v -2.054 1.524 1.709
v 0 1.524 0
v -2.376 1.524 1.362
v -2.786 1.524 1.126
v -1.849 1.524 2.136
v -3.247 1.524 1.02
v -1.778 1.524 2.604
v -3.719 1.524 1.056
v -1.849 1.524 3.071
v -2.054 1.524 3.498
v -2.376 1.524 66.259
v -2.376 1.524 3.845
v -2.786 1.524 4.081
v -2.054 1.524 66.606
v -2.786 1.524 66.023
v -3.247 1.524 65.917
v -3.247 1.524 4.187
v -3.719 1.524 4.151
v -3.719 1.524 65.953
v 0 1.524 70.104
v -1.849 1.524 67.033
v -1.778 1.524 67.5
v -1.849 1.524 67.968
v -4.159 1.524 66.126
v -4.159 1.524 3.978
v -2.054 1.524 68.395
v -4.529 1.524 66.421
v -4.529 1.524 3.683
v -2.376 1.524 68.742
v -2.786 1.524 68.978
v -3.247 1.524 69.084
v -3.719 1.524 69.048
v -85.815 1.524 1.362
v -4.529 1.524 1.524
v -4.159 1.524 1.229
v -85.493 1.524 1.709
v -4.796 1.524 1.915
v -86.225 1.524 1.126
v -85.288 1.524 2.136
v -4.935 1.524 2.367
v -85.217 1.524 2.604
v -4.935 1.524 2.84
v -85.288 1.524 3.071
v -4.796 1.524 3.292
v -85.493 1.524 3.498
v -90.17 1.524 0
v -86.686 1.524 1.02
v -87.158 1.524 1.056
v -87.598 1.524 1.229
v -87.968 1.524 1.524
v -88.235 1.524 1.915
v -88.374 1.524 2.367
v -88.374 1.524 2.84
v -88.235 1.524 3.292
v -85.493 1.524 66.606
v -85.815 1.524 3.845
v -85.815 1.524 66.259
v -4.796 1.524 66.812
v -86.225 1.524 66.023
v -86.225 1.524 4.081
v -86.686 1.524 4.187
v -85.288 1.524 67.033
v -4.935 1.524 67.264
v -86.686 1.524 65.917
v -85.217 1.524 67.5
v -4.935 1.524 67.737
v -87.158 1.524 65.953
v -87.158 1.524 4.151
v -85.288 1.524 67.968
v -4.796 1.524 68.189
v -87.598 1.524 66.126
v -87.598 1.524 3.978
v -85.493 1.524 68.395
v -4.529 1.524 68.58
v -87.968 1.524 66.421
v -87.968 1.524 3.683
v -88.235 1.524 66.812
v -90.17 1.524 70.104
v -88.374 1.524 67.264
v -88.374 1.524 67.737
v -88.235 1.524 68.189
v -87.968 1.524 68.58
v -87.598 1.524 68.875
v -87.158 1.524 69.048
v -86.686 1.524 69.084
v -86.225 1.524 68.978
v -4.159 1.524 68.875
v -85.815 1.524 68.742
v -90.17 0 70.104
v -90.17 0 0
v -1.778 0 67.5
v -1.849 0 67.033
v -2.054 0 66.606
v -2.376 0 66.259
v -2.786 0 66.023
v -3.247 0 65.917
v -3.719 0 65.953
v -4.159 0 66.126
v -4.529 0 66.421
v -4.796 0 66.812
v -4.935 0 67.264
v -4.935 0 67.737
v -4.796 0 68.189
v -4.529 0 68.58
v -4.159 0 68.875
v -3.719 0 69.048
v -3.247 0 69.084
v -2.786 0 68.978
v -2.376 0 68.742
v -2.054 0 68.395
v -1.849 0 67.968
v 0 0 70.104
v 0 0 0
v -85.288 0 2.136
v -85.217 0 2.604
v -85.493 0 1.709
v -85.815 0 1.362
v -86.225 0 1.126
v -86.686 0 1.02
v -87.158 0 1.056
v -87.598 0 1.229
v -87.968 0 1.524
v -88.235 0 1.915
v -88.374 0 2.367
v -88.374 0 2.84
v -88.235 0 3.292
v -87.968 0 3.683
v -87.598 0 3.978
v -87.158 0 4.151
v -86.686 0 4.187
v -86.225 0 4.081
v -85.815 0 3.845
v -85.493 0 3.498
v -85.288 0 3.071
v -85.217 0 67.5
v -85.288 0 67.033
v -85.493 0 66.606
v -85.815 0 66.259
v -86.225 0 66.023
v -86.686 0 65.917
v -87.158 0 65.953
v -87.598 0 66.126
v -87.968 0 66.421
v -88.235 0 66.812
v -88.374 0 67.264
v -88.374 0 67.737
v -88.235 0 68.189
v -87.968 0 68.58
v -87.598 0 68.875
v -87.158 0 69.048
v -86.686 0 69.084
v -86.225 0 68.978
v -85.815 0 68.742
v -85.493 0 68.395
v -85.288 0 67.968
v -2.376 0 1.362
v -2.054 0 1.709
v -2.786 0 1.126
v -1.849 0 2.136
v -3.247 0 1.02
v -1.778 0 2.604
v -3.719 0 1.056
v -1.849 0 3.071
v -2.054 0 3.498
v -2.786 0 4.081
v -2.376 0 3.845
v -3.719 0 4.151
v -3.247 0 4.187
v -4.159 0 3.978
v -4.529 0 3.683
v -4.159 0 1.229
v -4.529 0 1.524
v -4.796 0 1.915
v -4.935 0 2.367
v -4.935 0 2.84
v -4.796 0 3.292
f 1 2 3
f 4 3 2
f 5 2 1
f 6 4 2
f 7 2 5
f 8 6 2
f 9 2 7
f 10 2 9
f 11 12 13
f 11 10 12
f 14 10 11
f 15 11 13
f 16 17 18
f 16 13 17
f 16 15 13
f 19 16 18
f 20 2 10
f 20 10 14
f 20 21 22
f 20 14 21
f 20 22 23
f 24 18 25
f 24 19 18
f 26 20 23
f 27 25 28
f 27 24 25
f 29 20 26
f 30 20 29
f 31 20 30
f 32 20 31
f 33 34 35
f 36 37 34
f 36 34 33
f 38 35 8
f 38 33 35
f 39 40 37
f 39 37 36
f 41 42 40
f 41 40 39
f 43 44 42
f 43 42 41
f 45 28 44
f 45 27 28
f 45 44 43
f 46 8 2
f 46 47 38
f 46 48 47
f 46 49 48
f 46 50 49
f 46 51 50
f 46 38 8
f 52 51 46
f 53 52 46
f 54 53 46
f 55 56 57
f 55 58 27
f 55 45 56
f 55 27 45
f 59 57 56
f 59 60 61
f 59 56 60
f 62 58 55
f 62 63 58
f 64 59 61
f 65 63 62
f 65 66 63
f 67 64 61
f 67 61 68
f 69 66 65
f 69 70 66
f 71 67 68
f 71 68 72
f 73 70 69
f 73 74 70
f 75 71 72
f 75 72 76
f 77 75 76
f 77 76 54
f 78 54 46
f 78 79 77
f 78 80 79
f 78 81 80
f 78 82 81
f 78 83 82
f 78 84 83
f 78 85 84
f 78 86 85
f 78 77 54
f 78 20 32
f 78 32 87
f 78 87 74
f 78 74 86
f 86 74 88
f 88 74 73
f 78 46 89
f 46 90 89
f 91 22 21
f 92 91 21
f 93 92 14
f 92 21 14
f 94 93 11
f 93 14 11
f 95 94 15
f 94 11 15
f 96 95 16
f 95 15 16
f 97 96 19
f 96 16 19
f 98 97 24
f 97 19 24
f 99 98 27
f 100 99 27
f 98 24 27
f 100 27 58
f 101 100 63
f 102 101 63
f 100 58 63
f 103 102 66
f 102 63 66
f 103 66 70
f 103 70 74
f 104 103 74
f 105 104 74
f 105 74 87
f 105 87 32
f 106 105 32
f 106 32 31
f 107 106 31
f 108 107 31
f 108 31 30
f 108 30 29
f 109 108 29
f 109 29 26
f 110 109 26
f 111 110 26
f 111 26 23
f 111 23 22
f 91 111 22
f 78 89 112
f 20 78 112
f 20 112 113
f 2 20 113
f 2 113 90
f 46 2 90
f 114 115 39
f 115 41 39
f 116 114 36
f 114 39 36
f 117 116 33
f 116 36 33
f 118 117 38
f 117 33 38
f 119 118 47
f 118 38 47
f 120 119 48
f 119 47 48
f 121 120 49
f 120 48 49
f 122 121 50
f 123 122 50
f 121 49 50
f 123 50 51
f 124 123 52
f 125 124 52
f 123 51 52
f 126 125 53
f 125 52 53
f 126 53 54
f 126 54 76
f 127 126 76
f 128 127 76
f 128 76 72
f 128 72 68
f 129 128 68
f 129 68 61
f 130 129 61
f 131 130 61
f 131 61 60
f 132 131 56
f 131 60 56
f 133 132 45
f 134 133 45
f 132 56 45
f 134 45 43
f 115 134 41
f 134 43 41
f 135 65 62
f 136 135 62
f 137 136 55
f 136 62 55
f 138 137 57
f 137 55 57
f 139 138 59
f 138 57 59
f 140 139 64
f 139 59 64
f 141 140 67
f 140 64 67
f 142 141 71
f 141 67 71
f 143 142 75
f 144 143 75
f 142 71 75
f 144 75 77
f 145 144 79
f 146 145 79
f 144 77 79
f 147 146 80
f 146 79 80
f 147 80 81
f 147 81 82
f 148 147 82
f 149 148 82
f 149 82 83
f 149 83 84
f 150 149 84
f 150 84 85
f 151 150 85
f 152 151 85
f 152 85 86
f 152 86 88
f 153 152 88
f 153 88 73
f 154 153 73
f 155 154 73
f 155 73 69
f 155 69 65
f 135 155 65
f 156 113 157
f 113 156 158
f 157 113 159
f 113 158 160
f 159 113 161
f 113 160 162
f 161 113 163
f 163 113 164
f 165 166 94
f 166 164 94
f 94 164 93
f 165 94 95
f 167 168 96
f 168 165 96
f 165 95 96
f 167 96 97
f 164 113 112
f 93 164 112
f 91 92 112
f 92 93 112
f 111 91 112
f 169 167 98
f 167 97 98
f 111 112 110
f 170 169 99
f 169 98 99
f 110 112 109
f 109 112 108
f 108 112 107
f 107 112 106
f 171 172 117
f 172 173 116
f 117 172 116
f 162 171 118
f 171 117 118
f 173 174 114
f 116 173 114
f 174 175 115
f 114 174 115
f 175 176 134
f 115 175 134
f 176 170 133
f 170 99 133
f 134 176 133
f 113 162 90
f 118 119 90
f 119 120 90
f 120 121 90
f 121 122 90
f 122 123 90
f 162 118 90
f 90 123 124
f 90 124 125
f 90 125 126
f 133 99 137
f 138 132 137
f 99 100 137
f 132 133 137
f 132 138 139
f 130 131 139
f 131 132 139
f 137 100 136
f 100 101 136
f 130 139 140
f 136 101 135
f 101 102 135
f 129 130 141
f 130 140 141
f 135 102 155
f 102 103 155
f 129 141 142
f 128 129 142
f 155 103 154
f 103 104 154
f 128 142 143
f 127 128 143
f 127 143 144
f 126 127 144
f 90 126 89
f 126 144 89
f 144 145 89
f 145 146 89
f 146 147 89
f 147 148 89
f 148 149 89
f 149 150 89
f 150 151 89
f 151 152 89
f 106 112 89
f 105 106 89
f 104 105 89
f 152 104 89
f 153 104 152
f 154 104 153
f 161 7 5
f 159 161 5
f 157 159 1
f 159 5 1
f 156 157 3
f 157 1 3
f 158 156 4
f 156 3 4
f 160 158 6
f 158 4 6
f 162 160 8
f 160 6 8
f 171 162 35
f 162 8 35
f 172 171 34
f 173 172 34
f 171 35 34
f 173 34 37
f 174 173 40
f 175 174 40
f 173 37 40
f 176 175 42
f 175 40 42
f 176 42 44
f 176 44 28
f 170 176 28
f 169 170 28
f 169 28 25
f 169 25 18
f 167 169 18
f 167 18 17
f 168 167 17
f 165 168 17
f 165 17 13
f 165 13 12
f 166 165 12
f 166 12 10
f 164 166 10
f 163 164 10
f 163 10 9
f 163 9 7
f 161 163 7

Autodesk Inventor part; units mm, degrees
ref_plane "YZ Plane" through (0, 0, 0) normal (1, 0, 0) x (0, 1, 0)
ref_plane "XZ Plane" through (0, 0, 0) normal (0, 1, 0) x (-1, 0, 0)
ref_plane "XY Plane" through (0, 0, 0) normal (0, 0, 1) x (1, 0, 0)
sketch "Sketch1" plane through (0, 0, 0) normal (0, 1, 0) x (-1, 0, 0)
  line L0 (0, 0) -> (90.17, 0)
  line L1 (90.17, 0) -> (90.17, 70.104)
  line L2 (90.17, 70.104) -> (0, 70.104)
  line L3 (0, 70.104) -> (0, 0)
  dimension "PCB_Length" = 90.17
  dimension "PCB_Width" = 70.104
extrude "Extrusion1" add sketch "Sketch1" along normal blind 1.524
sketch "Sketch2" plane through (0, 1.524, 0) normal (0, 1, 0) x (1, 0, 0)
  circle A0 centre (-3.3655, -2.6035) radius 1.5875
  circle A1 centre (-86.8045, -2.6035) radius 1.5875
  circle A2 centre (-86.8045, -67.5005) radius 1.5875
  circle A3 centre (-3.3655, -67.5005) radius 1.5875
  line L0 (-90.17, -70.104) -> (0, -70.104) projected
  line L1 (0, -70.104) -> (0, 0) projected
  line L2 (0, 0) -> (-90.17, 0) projected
  line L3 (-90.17, 0) -> (-90.17, -70.104) projected
  point P0 (-3.3655, -69.088)
  point P1 (-1.778, -67.5005)
  point P2 (-3.3655, -1.016)
  point P3 (-1.778, -2.6035)
  point P4 (-86.8045, -1.016)
  point P5 (-88.392, -2.6035)
  point P6 (-86.8045, -69.088)
  point P7 (-88.392, -67.5005)
  dimension "d4" = 3.175
  dimension "d5" = 1.016
  dimension "d6" = 1.778
  dimension "d7" = 1.016
  dimension "d8" = 1.778
  dimension "d9" = 1.016
  dimension "d10" = 1.778
  dimension "d11" = 1.016
  dimension "d12" = 1.778
extrude "Extrusion2" cut sketch "Sketch2" against normal through all contours A0 | A1 | A2 | A3
properties part number "PCB"
